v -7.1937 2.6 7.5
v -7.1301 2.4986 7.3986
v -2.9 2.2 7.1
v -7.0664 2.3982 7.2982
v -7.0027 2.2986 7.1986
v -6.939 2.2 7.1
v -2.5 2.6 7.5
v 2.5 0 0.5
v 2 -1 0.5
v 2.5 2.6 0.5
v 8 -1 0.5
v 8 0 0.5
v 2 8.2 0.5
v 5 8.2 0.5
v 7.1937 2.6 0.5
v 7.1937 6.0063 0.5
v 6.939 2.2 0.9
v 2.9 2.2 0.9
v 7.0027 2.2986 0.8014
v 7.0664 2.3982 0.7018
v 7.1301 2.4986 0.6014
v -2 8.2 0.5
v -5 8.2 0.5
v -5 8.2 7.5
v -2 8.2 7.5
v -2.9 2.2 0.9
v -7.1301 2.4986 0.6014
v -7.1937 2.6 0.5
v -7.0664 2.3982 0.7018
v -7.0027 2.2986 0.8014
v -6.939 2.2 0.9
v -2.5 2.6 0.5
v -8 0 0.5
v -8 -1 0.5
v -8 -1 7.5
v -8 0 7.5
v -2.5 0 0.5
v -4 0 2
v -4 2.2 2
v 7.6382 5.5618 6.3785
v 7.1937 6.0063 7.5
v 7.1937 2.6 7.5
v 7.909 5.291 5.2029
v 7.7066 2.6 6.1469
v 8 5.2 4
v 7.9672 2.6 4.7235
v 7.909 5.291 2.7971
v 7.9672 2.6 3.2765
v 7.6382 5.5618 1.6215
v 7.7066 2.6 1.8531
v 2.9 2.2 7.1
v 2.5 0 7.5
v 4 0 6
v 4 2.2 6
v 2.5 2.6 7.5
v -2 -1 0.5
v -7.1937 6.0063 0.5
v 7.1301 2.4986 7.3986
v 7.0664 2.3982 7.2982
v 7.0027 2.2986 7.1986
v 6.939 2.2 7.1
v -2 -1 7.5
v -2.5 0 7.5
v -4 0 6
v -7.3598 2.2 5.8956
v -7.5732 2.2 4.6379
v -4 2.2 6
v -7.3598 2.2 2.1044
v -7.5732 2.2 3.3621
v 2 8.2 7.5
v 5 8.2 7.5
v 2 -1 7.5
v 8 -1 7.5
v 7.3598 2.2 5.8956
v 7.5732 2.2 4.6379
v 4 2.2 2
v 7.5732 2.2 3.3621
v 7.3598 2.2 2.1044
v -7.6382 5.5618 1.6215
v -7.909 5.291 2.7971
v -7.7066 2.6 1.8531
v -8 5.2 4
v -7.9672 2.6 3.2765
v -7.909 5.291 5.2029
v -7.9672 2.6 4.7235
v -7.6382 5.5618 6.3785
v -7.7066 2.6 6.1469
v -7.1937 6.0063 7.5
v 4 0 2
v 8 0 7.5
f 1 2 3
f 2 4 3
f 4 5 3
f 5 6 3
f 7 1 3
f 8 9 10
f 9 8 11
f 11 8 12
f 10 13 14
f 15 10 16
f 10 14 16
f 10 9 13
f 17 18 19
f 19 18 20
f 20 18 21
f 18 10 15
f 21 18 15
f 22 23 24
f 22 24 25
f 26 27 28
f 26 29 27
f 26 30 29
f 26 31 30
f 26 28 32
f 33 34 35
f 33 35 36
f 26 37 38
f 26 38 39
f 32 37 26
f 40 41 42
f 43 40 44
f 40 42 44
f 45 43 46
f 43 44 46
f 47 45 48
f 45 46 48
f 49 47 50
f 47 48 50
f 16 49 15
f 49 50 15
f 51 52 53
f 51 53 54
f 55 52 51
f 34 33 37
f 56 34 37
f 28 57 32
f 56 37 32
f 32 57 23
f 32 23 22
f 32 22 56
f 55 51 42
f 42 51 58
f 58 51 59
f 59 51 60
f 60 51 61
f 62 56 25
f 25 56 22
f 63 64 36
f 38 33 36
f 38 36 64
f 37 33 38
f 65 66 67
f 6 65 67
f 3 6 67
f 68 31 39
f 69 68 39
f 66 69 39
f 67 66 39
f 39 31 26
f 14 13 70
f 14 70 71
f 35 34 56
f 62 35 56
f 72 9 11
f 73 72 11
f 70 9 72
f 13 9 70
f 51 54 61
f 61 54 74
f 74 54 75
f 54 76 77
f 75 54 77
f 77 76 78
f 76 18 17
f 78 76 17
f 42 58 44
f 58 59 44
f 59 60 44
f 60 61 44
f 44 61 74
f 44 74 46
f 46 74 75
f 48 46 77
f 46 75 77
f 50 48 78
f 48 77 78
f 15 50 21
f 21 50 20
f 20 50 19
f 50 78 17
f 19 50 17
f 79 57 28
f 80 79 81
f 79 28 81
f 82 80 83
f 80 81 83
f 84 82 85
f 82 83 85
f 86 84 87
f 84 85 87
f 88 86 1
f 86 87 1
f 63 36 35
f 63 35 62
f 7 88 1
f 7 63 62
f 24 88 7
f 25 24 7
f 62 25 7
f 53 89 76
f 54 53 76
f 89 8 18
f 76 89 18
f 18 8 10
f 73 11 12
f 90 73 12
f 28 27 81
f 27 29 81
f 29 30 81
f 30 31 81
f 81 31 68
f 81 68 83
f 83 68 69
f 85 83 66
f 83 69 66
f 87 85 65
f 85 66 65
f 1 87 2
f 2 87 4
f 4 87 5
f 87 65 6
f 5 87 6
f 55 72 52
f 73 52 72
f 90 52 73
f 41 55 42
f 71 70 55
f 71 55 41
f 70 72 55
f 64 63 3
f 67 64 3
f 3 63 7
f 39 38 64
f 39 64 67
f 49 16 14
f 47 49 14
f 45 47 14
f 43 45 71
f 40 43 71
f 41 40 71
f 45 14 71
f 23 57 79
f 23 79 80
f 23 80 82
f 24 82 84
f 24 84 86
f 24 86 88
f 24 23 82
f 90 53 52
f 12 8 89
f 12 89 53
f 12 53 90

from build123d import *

# Parameters (mm, degrees)
BOX005_W        = 6
BOX005_H        = 1
BOX005_DEPTH    = 7
BOX002_W        = 6
BOX002_H        = 1
BOX002_DEPTH    = 7
BOX001_W        = 2
BOX001_H        = 9
BOX001_DEPTH    = 7
BOX_W           = 2
BOX_H           = 9
BOX_DEPTH       = 7
CHAMFER_SIZE    = 1.5
BOX003_W        = 6
BOX003_H        = 6
BOX003_DEPTH    = 7
BOX004_W        = 6
BOX004_H        = 6
BOX004_DEPTH    = 7
CHAMFER001_SIZE = 3
CYLINDER_R      = 8
CYLINDER_DEPTH  = 10
CHAMFER002_SIZE = 0.4


with BuildPart() as cube005:
    # Box005 → Box005 (new body)
    with BuildSketch(Plane(origin=(2, -1, 0.5), x_dir=(1, 0, 0), z_dir=(0, 0, 1))):
        with Locations((3, 0.5)):
            Rectangle(BOX005_W, BOX005_H)
    extrude(amount=BOX005_DEPTH)


with BuildPart() as cube002:
    # Box002 → Box002 (new body)
    with BuildSketch(Plane(origin=(-8, -1, 0.5), x_dir=(1, 0, 0), z_dir=(0, 0, 1))):
        with Locations((3, 0.5)):
            Rectangle(BOX002_W, BOX002_H)
    extrude(amount=BOX002_DEPTH)


with BuildPart() as cube001:
    # Box001 → Box001 (new body)
    with BuildSketch(Plane(origin=(2, -1, 0.5), x_dir=(1, 0, 0), z_dir=(0, 0, 1))):
        with Locations((1, 4.5)):
            Rectangle(BOX001_W, BOX001_H)
    extrude(amount=BOX001_DEPTH)


with BuildPart() as chamfer_body:
    # Box → Box (new body)
    with BuildSketch(Plane(origin=(-4, -1, 0.5), x_dir=(1, 0, 0), z_dir=(0, 0, 1))):
        with Locations((1, 4.5)):
            Rectangle(BOX_W, BOX_H)
    extrude(amount=BOX_DEPTH)

    # Fusion: union Cube001
    add(cube001.part)

    # Chamfer
    chamfer_edges = [chamfer_body.edges().sort_by_distance(p)[0] for p in [
        (-4, 3.5, 7.5),
        (-4, 3.5, 0.5),
        (4, 3.5, 7.5),
        (4, 3.5, 0.5),
    ]]
    chamfer(chamfer_edges, length=CHAMFER_SIZE)


with BuildPart() as cube003:
    # Box003 → Box003 (new body)
    with BuildSketch(Plane(origin=(2, 2, 0.5), x_dir=(1, 0, 0), z_dir=(0, 0, 1))):
        with Locations((3, 3)):
            Rectangle(BOX003_W, BOX003_H)
    extrude(amount=BOX003_DEPTH)


with BuildPart() as chamfer001:
    # Box004 → Box004 (new body)
    with BuildSketch(Plane(origin=(-8, 2, 0.5), x_dir=(1, 0, 0), z_dir=(0, 0, 1))):
        with Locations((3, 3)):
            Rectangle(BOX004_W, BOX004_H)
    extrude(amount=BOX004_DEPTH)

    # Fusion001: union Cube003
    add(cube003.part)

    # Chamfer001
    chamfer001_edges = [chamfer001.edges().sort_by_distance(p)[0] for p in [
        (-8, 8, 4),
        (8, 8, 4),
    ]]
    chamfer(chamfer001_edges, length=CHAMFER001_SIZE)


with BuildPart() as chamfer001_1:
    # Chamfer001 placement: moved
    add(chamfer001.part.moved(Location((0, 0.2, 0))))


with BuildPart() as mounter_base:
    # Cylinder → Cylinder (new body)
    with BuildSketch(Plane(origin=(0, 0, 4), x_dir=(1, 0, 0), z_dir=(0, 1, 0))):
        Circle(CYLINDER_R)
    extrude(amount=CYLINDER_DEPTH)

    # Common: intersect Chamfer001
    add(chamfer001_1.part, mode=Mode.INTERSECT)

    # Chamfer002
    chamfer002_edges = [mounter_base.edges().sort_by_distance(p)[0] for p in [
        (7.795832, 2.2, 5.795832),
        (7.795832, 2.2, 2.204168),
        (4.596874, 2.2, 0.5),
        (4.596874, 2.2, 7.5),
        (-7.795832, 2.2, 5.795832),
        (-7.795832, 2.2, 2.204168),
        (-4.596874, 2.2, 7.5),
        (-4.596874, 2.2, 0.5),
    ]]
    chamfer(chamfer002_edges, length=CHAMFER002_SIZE)

    # Fusion002: union Cube005, Cube002, Chamfer body
    add(cube005.part)
    add(cube002.part)
    add(chamfer_body.part)


solid = mounter_base.part
